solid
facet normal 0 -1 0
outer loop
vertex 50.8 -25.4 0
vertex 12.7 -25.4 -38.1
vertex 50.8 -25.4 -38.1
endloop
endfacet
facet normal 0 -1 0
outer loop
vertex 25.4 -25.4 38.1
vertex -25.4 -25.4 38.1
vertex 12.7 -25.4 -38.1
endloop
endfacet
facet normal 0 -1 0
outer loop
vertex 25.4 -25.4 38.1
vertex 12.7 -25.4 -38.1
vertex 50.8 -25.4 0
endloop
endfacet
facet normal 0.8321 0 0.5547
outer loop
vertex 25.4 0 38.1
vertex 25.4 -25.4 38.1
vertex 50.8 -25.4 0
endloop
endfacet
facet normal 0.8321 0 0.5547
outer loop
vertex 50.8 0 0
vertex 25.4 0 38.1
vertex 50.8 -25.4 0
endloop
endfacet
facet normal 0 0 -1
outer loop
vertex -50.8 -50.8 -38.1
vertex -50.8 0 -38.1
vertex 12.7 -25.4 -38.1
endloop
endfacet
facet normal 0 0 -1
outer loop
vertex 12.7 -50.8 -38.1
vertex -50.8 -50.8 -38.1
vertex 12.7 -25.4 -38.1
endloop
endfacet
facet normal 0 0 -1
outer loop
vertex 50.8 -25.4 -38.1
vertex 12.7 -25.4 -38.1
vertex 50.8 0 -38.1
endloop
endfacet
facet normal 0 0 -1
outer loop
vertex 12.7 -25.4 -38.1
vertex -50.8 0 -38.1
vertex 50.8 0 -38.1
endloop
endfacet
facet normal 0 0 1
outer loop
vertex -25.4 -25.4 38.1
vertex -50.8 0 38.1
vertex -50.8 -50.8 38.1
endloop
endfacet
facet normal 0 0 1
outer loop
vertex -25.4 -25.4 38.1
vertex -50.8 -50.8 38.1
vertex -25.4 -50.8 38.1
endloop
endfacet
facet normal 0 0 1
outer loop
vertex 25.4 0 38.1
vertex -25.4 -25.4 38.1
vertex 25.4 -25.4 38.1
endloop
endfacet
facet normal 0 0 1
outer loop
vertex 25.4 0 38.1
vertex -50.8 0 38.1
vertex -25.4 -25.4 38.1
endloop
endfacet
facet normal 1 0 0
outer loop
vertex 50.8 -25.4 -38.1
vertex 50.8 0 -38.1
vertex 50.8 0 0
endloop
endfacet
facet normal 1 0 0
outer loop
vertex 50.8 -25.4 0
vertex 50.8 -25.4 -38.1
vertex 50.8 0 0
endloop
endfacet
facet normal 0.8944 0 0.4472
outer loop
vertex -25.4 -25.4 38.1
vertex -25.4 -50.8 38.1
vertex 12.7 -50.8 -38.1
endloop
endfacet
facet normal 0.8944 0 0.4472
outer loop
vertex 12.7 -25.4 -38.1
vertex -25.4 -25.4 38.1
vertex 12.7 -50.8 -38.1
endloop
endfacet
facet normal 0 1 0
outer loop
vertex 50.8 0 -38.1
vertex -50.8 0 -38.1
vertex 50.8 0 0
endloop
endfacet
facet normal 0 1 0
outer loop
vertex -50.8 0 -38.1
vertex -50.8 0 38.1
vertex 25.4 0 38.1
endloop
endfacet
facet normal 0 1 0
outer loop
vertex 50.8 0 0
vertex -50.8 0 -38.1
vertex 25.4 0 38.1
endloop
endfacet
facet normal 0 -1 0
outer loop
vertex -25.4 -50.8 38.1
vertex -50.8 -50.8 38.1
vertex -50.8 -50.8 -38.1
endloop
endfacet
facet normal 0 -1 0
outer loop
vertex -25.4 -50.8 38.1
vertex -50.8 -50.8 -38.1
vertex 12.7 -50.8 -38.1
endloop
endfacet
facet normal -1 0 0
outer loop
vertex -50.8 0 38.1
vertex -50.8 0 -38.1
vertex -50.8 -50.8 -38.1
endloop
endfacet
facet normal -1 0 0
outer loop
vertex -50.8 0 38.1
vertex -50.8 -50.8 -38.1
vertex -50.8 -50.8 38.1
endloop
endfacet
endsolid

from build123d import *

# Parameters (mm, degrees)
F0_W     = 101.6
F0_H     = 76.2
F1_DEPTH = 50.8
F3_DEPTH = 25.4
F5_DEPTH = 25.4


with BuildPart() as f1:
    # F0 (on Front) → F1 (new body)
    with BuildSketch(Plane.XZ):
        Rectangle(F0_W, F0_H)
    extrude(amount=F1_DEPTH)

    # F2 (on face) → F3 (cut)
    with BuildSketch(Plane.XZ.offset(50.8)):
        Polygon((50.8, 38.1), (-25.4, 38.1), (12.7, -38.1), (50.8, -38.1), align=None)
    extrude(amount=-F3_DEPTH, mode=Mode.SUBTRACT)

    # F4 (on face) → F5 (cut)
    with BuildSketch(Plane.XZ.offset(25.4)):
        Polygon((50.8, 38.1), (25.4, 38.1), (50.8, 0), align=None)
    extrude(amount=-F5_DEPTH, mode=Mode.SUBTRACT)


solid = f1.part
